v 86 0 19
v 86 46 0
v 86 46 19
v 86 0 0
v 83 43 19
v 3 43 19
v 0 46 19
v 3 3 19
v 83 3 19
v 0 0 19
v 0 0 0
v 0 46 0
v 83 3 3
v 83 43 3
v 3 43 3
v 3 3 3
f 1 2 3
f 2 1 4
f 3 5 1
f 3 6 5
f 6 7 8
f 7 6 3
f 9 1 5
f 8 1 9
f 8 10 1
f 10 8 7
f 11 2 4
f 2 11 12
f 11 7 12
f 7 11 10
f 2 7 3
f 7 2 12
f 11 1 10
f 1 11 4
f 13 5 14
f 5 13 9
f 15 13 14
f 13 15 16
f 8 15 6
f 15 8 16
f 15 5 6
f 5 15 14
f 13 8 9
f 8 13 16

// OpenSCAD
$fn=200;


l       = 86        ; // length
w       = 46        ; // width
h       = 19        ; // height
t       = 3         ; // thickness
int_l   = l-2*t     ;
int_w   = w-2*t     ;
int_h   = h-t       ;

length = l;
width= w;
height = h;
thickness = t;
int_length = int_l;
int_width = int_w;
int_height = int_h;
cornerRadius = 0;
height_of_top_and_bottom = 5;

echo(l      ) ;
echo(w      ) ;
echo(h      ) ;
echo(int_l  ) ;
echo(int_w  ) ;
echo(int_h  ) ;

difference (){
    box(l,w,h);
    translate([t, t, t]){
        box(int_l,int_w,int_h);
        }
}


module box(length,width,height)
{
    cube(size=[length,width,height]);    
}
//rainures( 200,200,1);
/*
translate([0, 0, 0]){
    difference() {
            roundedBox(length, width, height, cornerRadius); 
            translate([1,1,1]) {
                roundedBox(length-2, width-2, height-1, cornerRadius); 
            }
            
            translate([widht/2,0,0]) {
                rainures( 1, 10, 1); 
            }
            
    }
}
*/
/*
translate([width*2 +1 , 0, 0]){
    mirror([1,0,0]) {
        roundedBox(length, width, 1, cornerRadius);
        difference() {
            translate([1,1,0]) {
                roundedBox(length-2,width-2,4,cornerRadius);
            }
            
            translate([2,2,0]) {
                roundedBox(length-4,width-4,4,cornerRadius);
            }
            
            translate([width*2 +1 ,20,0]){
                    rainures(length, width, 1);
                }
        }
    }
}
*/
//handle
/*
translate([0,length,0]) {
    difference() {
        difference() {
            cylinder(h=2, r=10);
            cylinder(h=2, r=5);

        }
        translate([0,-10,0]) {
            cube(size=[10,10,2]);        
        }
    }
}
*/
/*
module rainures(lenght,width,height)
{
        cube(size=[length,width,height]);
}

module roundedBox(length, width, height, radius)
{
    dRadius = 2*radius;

    //cube bottom right
    translate([width-dRadius,-radius,0]) {
        cube(size=[radius,radius,height+ height_of_top_and_bottom]);
    }
    
    
    //cube top left
    translate([-radius,length-dRadius,0]) {
        cube(size=[radius,radius,height+ height_of_top_and_bottom ]);
    }
    
    
    //base rounded shape
    minkowski() {
        cube(size=[width-dRadius,length-dRadius, height]);
        cylinder(r=radius, h=height_of_top_and_bottom);
    }
  
    
  
}
*/
